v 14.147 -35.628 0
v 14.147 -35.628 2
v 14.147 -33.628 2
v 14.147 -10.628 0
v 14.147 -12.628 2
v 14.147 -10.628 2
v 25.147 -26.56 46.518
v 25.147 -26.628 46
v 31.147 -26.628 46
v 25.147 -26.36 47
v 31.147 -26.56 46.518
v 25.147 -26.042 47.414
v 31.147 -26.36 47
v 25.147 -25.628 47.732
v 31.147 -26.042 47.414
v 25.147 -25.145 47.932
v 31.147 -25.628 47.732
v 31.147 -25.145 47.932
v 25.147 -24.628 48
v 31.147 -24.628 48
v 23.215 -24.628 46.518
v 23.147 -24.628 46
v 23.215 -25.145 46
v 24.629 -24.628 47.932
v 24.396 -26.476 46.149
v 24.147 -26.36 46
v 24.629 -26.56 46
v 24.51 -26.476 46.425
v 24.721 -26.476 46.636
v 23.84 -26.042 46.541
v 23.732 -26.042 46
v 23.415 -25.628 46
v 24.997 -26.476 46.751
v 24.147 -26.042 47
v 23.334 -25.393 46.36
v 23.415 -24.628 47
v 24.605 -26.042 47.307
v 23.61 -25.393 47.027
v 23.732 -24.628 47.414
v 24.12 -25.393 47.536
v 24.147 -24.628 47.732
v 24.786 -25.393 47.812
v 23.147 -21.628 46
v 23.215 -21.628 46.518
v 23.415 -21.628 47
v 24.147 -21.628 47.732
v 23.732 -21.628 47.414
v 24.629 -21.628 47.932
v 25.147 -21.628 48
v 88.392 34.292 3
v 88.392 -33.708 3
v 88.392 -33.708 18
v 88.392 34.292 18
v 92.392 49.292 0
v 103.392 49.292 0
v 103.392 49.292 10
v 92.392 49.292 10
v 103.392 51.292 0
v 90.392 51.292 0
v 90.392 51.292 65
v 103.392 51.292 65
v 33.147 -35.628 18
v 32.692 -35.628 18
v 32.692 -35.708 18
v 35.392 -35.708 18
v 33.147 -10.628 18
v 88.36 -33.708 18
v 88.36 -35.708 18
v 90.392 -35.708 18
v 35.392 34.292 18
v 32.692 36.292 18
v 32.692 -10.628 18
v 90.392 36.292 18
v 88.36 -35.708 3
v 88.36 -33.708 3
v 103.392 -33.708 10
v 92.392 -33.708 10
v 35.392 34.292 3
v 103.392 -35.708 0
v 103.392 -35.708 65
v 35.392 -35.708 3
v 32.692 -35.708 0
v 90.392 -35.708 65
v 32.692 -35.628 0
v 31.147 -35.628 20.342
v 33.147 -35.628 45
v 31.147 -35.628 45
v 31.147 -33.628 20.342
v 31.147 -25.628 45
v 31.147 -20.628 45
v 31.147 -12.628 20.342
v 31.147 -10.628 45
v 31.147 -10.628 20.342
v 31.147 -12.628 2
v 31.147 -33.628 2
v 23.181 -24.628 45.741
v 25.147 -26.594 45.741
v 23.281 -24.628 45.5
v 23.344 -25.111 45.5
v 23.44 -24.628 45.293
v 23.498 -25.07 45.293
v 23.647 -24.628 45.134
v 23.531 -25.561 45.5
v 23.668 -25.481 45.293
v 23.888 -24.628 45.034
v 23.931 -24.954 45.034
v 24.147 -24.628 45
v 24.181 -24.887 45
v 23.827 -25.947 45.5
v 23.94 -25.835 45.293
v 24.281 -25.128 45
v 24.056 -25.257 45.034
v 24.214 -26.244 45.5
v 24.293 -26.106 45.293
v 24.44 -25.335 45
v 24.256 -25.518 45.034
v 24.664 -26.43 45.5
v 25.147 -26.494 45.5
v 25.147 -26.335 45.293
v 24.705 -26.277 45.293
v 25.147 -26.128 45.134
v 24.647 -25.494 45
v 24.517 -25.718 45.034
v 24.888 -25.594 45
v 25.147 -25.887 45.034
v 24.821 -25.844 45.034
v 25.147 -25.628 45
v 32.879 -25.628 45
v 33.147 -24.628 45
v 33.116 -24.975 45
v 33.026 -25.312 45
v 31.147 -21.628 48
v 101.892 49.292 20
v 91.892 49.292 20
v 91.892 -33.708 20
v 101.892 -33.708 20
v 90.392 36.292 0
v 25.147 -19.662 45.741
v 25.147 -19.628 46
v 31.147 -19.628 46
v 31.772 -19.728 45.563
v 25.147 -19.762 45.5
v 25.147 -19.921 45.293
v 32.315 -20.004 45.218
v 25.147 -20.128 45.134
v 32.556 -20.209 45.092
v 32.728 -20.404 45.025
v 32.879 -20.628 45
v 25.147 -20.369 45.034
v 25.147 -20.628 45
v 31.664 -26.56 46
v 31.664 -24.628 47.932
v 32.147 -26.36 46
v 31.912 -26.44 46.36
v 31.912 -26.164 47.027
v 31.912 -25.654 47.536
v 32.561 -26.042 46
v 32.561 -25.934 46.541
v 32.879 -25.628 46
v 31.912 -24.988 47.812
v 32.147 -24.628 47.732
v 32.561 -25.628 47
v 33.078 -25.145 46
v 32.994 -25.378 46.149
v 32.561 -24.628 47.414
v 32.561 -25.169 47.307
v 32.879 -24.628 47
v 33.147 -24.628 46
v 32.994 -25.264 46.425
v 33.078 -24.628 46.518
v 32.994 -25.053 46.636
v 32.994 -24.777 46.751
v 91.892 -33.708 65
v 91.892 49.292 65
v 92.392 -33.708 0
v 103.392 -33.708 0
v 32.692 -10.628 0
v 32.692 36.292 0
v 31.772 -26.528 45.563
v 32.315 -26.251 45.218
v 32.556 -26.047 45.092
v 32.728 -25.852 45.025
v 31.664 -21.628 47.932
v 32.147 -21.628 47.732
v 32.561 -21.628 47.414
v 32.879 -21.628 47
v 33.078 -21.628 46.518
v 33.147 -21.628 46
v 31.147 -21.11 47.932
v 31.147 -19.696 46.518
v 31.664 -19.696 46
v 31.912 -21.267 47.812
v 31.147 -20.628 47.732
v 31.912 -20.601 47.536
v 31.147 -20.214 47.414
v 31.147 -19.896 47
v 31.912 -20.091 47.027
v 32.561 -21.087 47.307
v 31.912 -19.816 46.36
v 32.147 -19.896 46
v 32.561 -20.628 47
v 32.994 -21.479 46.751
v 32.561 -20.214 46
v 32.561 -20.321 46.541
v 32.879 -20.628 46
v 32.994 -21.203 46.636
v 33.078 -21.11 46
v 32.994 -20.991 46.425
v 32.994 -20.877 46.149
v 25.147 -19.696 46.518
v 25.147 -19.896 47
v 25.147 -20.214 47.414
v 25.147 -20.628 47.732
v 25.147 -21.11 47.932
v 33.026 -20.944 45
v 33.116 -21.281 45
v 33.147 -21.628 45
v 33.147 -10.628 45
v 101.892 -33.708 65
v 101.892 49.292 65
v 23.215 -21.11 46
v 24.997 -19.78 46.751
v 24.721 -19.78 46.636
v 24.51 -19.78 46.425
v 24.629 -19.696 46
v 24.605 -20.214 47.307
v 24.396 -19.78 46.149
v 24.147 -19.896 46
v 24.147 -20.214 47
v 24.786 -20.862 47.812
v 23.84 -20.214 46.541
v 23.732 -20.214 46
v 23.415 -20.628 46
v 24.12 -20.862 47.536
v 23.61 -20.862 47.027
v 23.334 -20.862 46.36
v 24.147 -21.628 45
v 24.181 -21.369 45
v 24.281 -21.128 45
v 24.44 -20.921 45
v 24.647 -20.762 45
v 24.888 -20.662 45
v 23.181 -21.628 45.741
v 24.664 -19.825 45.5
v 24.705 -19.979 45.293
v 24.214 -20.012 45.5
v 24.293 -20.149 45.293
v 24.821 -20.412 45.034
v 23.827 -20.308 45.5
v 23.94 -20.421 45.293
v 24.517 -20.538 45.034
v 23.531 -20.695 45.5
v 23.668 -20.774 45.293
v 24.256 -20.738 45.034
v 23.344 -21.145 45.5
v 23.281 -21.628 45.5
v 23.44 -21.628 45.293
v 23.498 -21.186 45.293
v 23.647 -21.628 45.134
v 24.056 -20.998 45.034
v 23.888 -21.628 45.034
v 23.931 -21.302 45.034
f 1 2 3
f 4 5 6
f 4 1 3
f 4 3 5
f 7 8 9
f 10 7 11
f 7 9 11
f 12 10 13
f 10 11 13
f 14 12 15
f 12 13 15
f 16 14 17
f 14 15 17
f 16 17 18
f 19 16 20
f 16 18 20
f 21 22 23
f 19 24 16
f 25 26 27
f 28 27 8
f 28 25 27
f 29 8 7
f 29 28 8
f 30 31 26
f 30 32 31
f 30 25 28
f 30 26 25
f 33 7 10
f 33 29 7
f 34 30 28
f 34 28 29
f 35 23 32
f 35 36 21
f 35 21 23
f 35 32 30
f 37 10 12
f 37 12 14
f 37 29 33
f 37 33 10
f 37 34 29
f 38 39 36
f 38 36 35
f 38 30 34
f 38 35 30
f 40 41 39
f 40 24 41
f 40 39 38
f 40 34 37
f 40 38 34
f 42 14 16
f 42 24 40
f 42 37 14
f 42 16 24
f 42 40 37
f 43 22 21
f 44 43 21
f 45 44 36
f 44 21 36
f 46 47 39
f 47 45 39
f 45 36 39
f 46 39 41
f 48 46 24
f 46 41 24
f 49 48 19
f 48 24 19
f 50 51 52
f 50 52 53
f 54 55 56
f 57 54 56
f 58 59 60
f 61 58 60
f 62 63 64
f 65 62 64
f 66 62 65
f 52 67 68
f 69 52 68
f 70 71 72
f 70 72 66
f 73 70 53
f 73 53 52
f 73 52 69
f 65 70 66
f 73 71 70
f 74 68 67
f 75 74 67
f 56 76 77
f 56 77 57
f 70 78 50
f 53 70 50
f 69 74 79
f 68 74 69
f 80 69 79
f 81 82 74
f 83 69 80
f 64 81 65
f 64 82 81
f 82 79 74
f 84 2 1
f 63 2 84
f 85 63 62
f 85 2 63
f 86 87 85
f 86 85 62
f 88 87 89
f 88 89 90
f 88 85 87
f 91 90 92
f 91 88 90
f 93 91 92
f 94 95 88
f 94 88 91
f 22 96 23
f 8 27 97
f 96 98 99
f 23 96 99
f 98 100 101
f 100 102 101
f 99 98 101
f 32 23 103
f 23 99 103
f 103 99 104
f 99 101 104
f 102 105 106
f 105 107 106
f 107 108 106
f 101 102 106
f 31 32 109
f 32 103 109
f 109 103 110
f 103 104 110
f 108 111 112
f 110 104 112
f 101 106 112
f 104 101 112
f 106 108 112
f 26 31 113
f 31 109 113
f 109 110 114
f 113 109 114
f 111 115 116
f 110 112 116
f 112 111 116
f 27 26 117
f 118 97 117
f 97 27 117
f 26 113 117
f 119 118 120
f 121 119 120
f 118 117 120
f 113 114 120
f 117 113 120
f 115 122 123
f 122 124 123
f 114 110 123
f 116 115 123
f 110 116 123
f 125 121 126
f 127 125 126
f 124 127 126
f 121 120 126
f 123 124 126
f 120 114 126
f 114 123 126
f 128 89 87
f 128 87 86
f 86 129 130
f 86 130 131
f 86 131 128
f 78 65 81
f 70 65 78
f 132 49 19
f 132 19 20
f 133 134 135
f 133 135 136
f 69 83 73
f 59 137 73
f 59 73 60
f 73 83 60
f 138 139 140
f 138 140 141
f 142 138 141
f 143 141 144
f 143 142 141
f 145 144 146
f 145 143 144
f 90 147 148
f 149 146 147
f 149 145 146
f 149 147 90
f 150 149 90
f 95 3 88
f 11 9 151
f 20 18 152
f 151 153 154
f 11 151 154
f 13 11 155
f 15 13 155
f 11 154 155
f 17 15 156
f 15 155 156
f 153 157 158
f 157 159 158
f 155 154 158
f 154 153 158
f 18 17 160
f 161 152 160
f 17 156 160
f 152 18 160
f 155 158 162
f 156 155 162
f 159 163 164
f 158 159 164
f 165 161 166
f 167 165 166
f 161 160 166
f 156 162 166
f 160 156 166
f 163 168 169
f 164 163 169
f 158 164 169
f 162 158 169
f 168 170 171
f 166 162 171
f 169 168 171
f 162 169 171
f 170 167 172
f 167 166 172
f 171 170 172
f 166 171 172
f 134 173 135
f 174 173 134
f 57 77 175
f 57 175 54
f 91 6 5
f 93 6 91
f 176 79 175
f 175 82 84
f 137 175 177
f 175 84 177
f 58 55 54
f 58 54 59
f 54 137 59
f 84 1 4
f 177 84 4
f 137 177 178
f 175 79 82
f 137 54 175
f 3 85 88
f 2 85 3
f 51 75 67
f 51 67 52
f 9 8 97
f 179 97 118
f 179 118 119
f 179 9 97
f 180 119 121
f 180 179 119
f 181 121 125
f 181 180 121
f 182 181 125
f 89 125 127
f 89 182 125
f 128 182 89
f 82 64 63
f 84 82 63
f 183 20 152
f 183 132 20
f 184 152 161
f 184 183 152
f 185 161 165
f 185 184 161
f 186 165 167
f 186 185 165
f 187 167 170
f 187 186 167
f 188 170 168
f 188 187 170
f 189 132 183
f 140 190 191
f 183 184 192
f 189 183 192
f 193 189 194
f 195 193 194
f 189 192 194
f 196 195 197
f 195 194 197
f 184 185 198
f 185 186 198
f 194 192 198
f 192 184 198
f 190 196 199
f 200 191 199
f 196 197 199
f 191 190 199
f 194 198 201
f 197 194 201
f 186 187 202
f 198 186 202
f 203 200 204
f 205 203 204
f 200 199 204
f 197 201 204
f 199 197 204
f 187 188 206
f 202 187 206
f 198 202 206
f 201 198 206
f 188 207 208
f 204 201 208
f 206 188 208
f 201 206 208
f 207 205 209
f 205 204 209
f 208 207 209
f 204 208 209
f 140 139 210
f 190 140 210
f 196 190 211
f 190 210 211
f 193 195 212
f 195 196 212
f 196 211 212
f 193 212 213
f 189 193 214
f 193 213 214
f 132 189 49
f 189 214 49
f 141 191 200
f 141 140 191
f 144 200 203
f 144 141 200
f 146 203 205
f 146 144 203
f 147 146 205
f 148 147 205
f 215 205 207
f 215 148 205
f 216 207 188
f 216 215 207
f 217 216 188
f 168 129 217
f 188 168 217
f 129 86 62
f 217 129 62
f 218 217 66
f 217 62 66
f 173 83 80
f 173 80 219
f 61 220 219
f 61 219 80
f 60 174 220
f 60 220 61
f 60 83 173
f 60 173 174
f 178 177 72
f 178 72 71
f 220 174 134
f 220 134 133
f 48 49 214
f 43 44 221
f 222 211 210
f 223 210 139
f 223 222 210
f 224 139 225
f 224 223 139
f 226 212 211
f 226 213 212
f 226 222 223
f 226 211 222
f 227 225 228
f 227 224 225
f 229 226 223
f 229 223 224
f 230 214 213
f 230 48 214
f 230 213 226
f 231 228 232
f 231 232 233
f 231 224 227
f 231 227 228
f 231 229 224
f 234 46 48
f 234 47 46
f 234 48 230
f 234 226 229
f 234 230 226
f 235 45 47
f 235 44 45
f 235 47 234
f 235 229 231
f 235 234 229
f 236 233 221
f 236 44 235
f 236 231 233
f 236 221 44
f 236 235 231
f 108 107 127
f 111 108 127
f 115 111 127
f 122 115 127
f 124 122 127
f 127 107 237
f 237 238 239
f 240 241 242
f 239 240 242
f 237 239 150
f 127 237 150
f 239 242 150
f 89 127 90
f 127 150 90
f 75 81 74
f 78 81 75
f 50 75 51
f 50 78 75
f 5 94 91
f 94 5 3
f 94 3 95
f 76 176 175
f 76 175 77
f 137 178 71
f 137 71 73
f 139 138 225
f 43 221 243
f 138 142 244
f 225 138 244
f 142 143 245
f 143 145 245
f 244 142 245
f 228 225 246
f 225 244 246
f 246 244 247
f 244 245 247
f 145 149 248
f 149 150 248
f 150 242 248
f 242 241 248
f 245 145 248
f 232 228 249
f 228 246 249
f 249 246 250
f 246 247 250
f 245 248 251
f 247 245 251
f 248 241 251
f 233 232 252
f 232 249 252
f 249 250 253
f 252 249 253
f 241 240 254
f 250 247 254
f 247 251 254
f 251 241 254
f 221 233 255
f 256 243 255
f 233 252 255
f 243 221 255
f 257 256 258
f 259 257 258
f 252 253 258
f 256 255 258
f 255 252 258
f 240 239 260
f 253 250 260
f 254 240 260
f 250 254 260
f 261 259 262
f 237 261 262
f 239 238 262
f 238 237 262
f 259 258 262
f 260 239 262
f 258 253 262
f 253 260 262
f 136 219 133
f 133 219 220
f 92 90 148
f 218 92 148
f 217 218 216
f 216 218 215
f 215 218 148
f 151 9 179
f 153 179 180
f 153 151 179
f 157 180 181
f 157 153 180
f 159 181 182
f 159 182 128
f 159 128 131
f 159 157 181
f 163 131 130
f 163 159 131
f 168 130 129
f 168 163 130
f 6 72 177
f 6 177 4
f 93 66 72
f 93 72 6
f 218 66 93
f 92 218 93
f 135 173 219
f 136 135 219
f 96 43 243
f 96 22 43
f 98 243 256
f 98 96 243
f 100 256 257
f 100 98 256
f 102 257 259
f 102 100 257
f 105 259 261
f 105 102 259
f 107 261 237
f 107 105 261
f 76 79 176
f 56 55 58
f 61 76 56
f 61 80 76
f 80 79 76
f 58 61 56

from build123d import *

# Parameters (mm, degrees)
F0_W      = 17
F0_H      = 25
F1_DEPTH  = 2
F0_W_2    = 2
F2_DEPTH  = 45
F3_W      = 2
F3_H      = 7
F4_DEPTH  = 3
F5_R      = 2
F6_R      = 2
F7_R      = 2
F8_R      = 2
F9_R      = 0.99999
F12_DEPTH = 2
F13_DEPTH = 2
F14_W     = 53
F14_H     = 68
F15_DEPTH = 3
F14_W_2   = 57
F14_H_2   = 72
F16_DEPTH = 23
F17_W     = 52.9679324031
F17_H     = 2
F18_DEPTH = 20
F19_DEPTH = 0.7
F21_DEPTH = 5
F22_W     = 87
F22_H     = 65
F23_DEPTH = 13
F25_W     = 83
F25_H     = 10
F26_DEPTH = 11
F24_W     = 10
F24_H     = 83
F27_DEPTH = 45
F28_DEPTH = 45
F29_DEPTH = 45


# Not quite as in the source:
# - a fillet or chamfer is up to 0.001 mm smaller than in the source, because OpenCascade refuses the exact size


with BuildPart() as f1:
    # F0 (on Top) → F1 (new body)
    with BuildSketch(Plane.XY):
        with Locations((22.646613881, -23.1278307736)):
            Rectangle(F0_W, F0_H)
    extrude(amount=F1_DEPTH)

    # F0 (on Top) → F2 (join)
    with BuildSketch(Plane.XY):
        with Locations((32.146613881, -23.1278307736)):
            Rectangle(F0_W_2, F0_H)
    extrude(amount=F2_DEPTH)

    # F3 (on face) → F4 (join)
    with BuildSketch(Plane.XY.offset(45)):
        Polygon((29.146613881, -26.6278307736), (31.146613881, -26.6278307736), (31.146613881, -19.6278307736), (23.146613881, -19.6278307736), (23.146613881, -25.5845747888), (23.146613881, -26.6278307736), align=None)
        with Locations((32.146613881, -23.1278307736)):
            Rectangle(F3_W, F3_H)
    extrude(amount=F4_DEPTH)

    # F5
    f5_edges = [f1.edges().sort_by_distance(p)[0] for p in [
        (23.146614, -23.127831, 48),
    ]]
    fillet(f5_edges, radius=F5_R)

    # F6
    f6_edges = [f1.edges().sort_by_distance(p)[0] for p in [
        (29.146614, -26.627831, 48),
    ]]
    fillet(f6_edges, radius=F6_R)

    # F7
    f7_edges = [f1.edges().sort_by_distance(p)[0] for p in [
        (29.146614, -19.627831, 48),
    ]]
    fillet(f7_edges, radius=F7_R)

    # F8
    f8_edges = [f1.edges().sort_by_distance(p)[0] for p in [
        (33.146614, -23.127831, 48),
    ]]
    fillet(f8_edges, radius=F8_R)

    # F9 (radius 1 in the source; OpenCascade refuses exactly that, so slightly less here)
    f9_edges = [f1.edges().sort_by_distance(p)[0] for p in [
        (23.146614, -23.127831, 45),
    ]]
    fillet(f9_edges, radius=F9_R)

    # F11 (on face) → F12 (join)
    with BuildSketch(Plane.XZ.offset(35.6278307736)):
        Polygon((31.146613881, 2), (31.146613881, 20.3421052632), (14.146613881, 2), align=None)
    extrude(amount=-F12_DEPTH)

    # F10 (on face) → F13 (join)
    with BuildSketch(Plane(origin=(0, -10.6278307736, 0), x_dir=(-1, 0, 0), z_dir=(0, 1, 0))):
        Polygon((-14.146613881, 2), (-31.146613881, 20.3421052632), (-31.146613881, 2), align=None)
    extrude(amount=-F13_DEPTH)


with BuildPart() as f15:
    # F14 (on Top) → F15 (new body)
    with BuildSketch(Plane.XY):
        with Locations((61.8922058344, 0.291702956)):
            Rectangle(F14_W, F14_H)
    extrude(amount=F15_DEPTH)

    # F14 (on Top) → F16 (join)
    with BuildSketch(Plane.XY):
        with Locations((61.8922058344, 0.291702956)):
            Rectangle(F14_W_2, F14_H_2)
        with Locations((61.8922058344, 0.291702956)):
            Rectangle(F14_W, F14_H, mode=Mode.SUBTRACT)
    extrude(amount=F16_DEPTH)

    # F17 (on face) → F18 (cut)
    with BuildSketch(Plane.XY.offset(23)):
        with Locations((61.8761720359, -34.708297044)):
            Rectangle(F17_W, F17_H)
    extrude(amount=-F18_DEPTH, mode=Mode.SUBTRACT)


with BuildPart() as f19:
    # F19 (new): a face of the model
    f19_faces = [f15.part.faces().sort_by_distance(p)[0] for p in [
        (33.3922058344, 0.291702956, 11.5),
    ]]
    extrude(f19_faces, amount=F19_DEPTH)


with BuildPart() as f1_1:
    add(f1.part)

    # F20: union F19, F15
    add(f19.part)
    add(f15.part)

    # F21 (cut): a face of the model
    f21_faces = [f1_1.faces().sort_by_distance(p)[0] for p in [
        (61.5422058344, 35.3690280403, 23),
    ]]
    extrude(f21_faces, amount=-F21_DEPTH, mode=Mode.SUBTRACT)

    # F22 (on face) → F23 (join)
    with BuildSketch(Plane.YZ.offset(90.3922058344)):
        with Locations((7.791702956, 32.5)):
            Rectangle(F22_W, F22_H)
    extrude(amount=F23_DEPTH)

    # F25 (on face) → F26 (cut)
    with BuildSketch(Plane.YZ.offset(103.3922058344)):
        with Locations((7.791702956, 5)):
            Rectangle(F25_W, F25_H)
    extrude(amount=-F26_DEPTH, mode=Mode.SUBTRACT)

    # F24 (on face) → F27 (join)
    with BuildSketch(Plane.XY.offset(65)):
        with Locations((96.8922058344, 7.791702956)):
            Rectangle(F24_W, F24_H)
    extrude(amount=-F27_DEPTH)

    # F24 (on face) → F28 (join)
    with BuildSketch(Plane.XY.offset(65)):
        with Locations((96.8922058344, 7.791702956)):
            Rectangle(F24_W, F24_H)
    extrude(amount=-F28_DEPTH)

    # F24 (on face) → F29 (cut)
    with BuildSketch(Plane.XY.offset(65)):
        with Locations((96.8922058344, 7.791702956)):
            Rectangle(F24_W, F24_H)
    extrude(amount=-F29_DEPTH, mode=Mode.SUBTRACT)


solid = f1_1.part
